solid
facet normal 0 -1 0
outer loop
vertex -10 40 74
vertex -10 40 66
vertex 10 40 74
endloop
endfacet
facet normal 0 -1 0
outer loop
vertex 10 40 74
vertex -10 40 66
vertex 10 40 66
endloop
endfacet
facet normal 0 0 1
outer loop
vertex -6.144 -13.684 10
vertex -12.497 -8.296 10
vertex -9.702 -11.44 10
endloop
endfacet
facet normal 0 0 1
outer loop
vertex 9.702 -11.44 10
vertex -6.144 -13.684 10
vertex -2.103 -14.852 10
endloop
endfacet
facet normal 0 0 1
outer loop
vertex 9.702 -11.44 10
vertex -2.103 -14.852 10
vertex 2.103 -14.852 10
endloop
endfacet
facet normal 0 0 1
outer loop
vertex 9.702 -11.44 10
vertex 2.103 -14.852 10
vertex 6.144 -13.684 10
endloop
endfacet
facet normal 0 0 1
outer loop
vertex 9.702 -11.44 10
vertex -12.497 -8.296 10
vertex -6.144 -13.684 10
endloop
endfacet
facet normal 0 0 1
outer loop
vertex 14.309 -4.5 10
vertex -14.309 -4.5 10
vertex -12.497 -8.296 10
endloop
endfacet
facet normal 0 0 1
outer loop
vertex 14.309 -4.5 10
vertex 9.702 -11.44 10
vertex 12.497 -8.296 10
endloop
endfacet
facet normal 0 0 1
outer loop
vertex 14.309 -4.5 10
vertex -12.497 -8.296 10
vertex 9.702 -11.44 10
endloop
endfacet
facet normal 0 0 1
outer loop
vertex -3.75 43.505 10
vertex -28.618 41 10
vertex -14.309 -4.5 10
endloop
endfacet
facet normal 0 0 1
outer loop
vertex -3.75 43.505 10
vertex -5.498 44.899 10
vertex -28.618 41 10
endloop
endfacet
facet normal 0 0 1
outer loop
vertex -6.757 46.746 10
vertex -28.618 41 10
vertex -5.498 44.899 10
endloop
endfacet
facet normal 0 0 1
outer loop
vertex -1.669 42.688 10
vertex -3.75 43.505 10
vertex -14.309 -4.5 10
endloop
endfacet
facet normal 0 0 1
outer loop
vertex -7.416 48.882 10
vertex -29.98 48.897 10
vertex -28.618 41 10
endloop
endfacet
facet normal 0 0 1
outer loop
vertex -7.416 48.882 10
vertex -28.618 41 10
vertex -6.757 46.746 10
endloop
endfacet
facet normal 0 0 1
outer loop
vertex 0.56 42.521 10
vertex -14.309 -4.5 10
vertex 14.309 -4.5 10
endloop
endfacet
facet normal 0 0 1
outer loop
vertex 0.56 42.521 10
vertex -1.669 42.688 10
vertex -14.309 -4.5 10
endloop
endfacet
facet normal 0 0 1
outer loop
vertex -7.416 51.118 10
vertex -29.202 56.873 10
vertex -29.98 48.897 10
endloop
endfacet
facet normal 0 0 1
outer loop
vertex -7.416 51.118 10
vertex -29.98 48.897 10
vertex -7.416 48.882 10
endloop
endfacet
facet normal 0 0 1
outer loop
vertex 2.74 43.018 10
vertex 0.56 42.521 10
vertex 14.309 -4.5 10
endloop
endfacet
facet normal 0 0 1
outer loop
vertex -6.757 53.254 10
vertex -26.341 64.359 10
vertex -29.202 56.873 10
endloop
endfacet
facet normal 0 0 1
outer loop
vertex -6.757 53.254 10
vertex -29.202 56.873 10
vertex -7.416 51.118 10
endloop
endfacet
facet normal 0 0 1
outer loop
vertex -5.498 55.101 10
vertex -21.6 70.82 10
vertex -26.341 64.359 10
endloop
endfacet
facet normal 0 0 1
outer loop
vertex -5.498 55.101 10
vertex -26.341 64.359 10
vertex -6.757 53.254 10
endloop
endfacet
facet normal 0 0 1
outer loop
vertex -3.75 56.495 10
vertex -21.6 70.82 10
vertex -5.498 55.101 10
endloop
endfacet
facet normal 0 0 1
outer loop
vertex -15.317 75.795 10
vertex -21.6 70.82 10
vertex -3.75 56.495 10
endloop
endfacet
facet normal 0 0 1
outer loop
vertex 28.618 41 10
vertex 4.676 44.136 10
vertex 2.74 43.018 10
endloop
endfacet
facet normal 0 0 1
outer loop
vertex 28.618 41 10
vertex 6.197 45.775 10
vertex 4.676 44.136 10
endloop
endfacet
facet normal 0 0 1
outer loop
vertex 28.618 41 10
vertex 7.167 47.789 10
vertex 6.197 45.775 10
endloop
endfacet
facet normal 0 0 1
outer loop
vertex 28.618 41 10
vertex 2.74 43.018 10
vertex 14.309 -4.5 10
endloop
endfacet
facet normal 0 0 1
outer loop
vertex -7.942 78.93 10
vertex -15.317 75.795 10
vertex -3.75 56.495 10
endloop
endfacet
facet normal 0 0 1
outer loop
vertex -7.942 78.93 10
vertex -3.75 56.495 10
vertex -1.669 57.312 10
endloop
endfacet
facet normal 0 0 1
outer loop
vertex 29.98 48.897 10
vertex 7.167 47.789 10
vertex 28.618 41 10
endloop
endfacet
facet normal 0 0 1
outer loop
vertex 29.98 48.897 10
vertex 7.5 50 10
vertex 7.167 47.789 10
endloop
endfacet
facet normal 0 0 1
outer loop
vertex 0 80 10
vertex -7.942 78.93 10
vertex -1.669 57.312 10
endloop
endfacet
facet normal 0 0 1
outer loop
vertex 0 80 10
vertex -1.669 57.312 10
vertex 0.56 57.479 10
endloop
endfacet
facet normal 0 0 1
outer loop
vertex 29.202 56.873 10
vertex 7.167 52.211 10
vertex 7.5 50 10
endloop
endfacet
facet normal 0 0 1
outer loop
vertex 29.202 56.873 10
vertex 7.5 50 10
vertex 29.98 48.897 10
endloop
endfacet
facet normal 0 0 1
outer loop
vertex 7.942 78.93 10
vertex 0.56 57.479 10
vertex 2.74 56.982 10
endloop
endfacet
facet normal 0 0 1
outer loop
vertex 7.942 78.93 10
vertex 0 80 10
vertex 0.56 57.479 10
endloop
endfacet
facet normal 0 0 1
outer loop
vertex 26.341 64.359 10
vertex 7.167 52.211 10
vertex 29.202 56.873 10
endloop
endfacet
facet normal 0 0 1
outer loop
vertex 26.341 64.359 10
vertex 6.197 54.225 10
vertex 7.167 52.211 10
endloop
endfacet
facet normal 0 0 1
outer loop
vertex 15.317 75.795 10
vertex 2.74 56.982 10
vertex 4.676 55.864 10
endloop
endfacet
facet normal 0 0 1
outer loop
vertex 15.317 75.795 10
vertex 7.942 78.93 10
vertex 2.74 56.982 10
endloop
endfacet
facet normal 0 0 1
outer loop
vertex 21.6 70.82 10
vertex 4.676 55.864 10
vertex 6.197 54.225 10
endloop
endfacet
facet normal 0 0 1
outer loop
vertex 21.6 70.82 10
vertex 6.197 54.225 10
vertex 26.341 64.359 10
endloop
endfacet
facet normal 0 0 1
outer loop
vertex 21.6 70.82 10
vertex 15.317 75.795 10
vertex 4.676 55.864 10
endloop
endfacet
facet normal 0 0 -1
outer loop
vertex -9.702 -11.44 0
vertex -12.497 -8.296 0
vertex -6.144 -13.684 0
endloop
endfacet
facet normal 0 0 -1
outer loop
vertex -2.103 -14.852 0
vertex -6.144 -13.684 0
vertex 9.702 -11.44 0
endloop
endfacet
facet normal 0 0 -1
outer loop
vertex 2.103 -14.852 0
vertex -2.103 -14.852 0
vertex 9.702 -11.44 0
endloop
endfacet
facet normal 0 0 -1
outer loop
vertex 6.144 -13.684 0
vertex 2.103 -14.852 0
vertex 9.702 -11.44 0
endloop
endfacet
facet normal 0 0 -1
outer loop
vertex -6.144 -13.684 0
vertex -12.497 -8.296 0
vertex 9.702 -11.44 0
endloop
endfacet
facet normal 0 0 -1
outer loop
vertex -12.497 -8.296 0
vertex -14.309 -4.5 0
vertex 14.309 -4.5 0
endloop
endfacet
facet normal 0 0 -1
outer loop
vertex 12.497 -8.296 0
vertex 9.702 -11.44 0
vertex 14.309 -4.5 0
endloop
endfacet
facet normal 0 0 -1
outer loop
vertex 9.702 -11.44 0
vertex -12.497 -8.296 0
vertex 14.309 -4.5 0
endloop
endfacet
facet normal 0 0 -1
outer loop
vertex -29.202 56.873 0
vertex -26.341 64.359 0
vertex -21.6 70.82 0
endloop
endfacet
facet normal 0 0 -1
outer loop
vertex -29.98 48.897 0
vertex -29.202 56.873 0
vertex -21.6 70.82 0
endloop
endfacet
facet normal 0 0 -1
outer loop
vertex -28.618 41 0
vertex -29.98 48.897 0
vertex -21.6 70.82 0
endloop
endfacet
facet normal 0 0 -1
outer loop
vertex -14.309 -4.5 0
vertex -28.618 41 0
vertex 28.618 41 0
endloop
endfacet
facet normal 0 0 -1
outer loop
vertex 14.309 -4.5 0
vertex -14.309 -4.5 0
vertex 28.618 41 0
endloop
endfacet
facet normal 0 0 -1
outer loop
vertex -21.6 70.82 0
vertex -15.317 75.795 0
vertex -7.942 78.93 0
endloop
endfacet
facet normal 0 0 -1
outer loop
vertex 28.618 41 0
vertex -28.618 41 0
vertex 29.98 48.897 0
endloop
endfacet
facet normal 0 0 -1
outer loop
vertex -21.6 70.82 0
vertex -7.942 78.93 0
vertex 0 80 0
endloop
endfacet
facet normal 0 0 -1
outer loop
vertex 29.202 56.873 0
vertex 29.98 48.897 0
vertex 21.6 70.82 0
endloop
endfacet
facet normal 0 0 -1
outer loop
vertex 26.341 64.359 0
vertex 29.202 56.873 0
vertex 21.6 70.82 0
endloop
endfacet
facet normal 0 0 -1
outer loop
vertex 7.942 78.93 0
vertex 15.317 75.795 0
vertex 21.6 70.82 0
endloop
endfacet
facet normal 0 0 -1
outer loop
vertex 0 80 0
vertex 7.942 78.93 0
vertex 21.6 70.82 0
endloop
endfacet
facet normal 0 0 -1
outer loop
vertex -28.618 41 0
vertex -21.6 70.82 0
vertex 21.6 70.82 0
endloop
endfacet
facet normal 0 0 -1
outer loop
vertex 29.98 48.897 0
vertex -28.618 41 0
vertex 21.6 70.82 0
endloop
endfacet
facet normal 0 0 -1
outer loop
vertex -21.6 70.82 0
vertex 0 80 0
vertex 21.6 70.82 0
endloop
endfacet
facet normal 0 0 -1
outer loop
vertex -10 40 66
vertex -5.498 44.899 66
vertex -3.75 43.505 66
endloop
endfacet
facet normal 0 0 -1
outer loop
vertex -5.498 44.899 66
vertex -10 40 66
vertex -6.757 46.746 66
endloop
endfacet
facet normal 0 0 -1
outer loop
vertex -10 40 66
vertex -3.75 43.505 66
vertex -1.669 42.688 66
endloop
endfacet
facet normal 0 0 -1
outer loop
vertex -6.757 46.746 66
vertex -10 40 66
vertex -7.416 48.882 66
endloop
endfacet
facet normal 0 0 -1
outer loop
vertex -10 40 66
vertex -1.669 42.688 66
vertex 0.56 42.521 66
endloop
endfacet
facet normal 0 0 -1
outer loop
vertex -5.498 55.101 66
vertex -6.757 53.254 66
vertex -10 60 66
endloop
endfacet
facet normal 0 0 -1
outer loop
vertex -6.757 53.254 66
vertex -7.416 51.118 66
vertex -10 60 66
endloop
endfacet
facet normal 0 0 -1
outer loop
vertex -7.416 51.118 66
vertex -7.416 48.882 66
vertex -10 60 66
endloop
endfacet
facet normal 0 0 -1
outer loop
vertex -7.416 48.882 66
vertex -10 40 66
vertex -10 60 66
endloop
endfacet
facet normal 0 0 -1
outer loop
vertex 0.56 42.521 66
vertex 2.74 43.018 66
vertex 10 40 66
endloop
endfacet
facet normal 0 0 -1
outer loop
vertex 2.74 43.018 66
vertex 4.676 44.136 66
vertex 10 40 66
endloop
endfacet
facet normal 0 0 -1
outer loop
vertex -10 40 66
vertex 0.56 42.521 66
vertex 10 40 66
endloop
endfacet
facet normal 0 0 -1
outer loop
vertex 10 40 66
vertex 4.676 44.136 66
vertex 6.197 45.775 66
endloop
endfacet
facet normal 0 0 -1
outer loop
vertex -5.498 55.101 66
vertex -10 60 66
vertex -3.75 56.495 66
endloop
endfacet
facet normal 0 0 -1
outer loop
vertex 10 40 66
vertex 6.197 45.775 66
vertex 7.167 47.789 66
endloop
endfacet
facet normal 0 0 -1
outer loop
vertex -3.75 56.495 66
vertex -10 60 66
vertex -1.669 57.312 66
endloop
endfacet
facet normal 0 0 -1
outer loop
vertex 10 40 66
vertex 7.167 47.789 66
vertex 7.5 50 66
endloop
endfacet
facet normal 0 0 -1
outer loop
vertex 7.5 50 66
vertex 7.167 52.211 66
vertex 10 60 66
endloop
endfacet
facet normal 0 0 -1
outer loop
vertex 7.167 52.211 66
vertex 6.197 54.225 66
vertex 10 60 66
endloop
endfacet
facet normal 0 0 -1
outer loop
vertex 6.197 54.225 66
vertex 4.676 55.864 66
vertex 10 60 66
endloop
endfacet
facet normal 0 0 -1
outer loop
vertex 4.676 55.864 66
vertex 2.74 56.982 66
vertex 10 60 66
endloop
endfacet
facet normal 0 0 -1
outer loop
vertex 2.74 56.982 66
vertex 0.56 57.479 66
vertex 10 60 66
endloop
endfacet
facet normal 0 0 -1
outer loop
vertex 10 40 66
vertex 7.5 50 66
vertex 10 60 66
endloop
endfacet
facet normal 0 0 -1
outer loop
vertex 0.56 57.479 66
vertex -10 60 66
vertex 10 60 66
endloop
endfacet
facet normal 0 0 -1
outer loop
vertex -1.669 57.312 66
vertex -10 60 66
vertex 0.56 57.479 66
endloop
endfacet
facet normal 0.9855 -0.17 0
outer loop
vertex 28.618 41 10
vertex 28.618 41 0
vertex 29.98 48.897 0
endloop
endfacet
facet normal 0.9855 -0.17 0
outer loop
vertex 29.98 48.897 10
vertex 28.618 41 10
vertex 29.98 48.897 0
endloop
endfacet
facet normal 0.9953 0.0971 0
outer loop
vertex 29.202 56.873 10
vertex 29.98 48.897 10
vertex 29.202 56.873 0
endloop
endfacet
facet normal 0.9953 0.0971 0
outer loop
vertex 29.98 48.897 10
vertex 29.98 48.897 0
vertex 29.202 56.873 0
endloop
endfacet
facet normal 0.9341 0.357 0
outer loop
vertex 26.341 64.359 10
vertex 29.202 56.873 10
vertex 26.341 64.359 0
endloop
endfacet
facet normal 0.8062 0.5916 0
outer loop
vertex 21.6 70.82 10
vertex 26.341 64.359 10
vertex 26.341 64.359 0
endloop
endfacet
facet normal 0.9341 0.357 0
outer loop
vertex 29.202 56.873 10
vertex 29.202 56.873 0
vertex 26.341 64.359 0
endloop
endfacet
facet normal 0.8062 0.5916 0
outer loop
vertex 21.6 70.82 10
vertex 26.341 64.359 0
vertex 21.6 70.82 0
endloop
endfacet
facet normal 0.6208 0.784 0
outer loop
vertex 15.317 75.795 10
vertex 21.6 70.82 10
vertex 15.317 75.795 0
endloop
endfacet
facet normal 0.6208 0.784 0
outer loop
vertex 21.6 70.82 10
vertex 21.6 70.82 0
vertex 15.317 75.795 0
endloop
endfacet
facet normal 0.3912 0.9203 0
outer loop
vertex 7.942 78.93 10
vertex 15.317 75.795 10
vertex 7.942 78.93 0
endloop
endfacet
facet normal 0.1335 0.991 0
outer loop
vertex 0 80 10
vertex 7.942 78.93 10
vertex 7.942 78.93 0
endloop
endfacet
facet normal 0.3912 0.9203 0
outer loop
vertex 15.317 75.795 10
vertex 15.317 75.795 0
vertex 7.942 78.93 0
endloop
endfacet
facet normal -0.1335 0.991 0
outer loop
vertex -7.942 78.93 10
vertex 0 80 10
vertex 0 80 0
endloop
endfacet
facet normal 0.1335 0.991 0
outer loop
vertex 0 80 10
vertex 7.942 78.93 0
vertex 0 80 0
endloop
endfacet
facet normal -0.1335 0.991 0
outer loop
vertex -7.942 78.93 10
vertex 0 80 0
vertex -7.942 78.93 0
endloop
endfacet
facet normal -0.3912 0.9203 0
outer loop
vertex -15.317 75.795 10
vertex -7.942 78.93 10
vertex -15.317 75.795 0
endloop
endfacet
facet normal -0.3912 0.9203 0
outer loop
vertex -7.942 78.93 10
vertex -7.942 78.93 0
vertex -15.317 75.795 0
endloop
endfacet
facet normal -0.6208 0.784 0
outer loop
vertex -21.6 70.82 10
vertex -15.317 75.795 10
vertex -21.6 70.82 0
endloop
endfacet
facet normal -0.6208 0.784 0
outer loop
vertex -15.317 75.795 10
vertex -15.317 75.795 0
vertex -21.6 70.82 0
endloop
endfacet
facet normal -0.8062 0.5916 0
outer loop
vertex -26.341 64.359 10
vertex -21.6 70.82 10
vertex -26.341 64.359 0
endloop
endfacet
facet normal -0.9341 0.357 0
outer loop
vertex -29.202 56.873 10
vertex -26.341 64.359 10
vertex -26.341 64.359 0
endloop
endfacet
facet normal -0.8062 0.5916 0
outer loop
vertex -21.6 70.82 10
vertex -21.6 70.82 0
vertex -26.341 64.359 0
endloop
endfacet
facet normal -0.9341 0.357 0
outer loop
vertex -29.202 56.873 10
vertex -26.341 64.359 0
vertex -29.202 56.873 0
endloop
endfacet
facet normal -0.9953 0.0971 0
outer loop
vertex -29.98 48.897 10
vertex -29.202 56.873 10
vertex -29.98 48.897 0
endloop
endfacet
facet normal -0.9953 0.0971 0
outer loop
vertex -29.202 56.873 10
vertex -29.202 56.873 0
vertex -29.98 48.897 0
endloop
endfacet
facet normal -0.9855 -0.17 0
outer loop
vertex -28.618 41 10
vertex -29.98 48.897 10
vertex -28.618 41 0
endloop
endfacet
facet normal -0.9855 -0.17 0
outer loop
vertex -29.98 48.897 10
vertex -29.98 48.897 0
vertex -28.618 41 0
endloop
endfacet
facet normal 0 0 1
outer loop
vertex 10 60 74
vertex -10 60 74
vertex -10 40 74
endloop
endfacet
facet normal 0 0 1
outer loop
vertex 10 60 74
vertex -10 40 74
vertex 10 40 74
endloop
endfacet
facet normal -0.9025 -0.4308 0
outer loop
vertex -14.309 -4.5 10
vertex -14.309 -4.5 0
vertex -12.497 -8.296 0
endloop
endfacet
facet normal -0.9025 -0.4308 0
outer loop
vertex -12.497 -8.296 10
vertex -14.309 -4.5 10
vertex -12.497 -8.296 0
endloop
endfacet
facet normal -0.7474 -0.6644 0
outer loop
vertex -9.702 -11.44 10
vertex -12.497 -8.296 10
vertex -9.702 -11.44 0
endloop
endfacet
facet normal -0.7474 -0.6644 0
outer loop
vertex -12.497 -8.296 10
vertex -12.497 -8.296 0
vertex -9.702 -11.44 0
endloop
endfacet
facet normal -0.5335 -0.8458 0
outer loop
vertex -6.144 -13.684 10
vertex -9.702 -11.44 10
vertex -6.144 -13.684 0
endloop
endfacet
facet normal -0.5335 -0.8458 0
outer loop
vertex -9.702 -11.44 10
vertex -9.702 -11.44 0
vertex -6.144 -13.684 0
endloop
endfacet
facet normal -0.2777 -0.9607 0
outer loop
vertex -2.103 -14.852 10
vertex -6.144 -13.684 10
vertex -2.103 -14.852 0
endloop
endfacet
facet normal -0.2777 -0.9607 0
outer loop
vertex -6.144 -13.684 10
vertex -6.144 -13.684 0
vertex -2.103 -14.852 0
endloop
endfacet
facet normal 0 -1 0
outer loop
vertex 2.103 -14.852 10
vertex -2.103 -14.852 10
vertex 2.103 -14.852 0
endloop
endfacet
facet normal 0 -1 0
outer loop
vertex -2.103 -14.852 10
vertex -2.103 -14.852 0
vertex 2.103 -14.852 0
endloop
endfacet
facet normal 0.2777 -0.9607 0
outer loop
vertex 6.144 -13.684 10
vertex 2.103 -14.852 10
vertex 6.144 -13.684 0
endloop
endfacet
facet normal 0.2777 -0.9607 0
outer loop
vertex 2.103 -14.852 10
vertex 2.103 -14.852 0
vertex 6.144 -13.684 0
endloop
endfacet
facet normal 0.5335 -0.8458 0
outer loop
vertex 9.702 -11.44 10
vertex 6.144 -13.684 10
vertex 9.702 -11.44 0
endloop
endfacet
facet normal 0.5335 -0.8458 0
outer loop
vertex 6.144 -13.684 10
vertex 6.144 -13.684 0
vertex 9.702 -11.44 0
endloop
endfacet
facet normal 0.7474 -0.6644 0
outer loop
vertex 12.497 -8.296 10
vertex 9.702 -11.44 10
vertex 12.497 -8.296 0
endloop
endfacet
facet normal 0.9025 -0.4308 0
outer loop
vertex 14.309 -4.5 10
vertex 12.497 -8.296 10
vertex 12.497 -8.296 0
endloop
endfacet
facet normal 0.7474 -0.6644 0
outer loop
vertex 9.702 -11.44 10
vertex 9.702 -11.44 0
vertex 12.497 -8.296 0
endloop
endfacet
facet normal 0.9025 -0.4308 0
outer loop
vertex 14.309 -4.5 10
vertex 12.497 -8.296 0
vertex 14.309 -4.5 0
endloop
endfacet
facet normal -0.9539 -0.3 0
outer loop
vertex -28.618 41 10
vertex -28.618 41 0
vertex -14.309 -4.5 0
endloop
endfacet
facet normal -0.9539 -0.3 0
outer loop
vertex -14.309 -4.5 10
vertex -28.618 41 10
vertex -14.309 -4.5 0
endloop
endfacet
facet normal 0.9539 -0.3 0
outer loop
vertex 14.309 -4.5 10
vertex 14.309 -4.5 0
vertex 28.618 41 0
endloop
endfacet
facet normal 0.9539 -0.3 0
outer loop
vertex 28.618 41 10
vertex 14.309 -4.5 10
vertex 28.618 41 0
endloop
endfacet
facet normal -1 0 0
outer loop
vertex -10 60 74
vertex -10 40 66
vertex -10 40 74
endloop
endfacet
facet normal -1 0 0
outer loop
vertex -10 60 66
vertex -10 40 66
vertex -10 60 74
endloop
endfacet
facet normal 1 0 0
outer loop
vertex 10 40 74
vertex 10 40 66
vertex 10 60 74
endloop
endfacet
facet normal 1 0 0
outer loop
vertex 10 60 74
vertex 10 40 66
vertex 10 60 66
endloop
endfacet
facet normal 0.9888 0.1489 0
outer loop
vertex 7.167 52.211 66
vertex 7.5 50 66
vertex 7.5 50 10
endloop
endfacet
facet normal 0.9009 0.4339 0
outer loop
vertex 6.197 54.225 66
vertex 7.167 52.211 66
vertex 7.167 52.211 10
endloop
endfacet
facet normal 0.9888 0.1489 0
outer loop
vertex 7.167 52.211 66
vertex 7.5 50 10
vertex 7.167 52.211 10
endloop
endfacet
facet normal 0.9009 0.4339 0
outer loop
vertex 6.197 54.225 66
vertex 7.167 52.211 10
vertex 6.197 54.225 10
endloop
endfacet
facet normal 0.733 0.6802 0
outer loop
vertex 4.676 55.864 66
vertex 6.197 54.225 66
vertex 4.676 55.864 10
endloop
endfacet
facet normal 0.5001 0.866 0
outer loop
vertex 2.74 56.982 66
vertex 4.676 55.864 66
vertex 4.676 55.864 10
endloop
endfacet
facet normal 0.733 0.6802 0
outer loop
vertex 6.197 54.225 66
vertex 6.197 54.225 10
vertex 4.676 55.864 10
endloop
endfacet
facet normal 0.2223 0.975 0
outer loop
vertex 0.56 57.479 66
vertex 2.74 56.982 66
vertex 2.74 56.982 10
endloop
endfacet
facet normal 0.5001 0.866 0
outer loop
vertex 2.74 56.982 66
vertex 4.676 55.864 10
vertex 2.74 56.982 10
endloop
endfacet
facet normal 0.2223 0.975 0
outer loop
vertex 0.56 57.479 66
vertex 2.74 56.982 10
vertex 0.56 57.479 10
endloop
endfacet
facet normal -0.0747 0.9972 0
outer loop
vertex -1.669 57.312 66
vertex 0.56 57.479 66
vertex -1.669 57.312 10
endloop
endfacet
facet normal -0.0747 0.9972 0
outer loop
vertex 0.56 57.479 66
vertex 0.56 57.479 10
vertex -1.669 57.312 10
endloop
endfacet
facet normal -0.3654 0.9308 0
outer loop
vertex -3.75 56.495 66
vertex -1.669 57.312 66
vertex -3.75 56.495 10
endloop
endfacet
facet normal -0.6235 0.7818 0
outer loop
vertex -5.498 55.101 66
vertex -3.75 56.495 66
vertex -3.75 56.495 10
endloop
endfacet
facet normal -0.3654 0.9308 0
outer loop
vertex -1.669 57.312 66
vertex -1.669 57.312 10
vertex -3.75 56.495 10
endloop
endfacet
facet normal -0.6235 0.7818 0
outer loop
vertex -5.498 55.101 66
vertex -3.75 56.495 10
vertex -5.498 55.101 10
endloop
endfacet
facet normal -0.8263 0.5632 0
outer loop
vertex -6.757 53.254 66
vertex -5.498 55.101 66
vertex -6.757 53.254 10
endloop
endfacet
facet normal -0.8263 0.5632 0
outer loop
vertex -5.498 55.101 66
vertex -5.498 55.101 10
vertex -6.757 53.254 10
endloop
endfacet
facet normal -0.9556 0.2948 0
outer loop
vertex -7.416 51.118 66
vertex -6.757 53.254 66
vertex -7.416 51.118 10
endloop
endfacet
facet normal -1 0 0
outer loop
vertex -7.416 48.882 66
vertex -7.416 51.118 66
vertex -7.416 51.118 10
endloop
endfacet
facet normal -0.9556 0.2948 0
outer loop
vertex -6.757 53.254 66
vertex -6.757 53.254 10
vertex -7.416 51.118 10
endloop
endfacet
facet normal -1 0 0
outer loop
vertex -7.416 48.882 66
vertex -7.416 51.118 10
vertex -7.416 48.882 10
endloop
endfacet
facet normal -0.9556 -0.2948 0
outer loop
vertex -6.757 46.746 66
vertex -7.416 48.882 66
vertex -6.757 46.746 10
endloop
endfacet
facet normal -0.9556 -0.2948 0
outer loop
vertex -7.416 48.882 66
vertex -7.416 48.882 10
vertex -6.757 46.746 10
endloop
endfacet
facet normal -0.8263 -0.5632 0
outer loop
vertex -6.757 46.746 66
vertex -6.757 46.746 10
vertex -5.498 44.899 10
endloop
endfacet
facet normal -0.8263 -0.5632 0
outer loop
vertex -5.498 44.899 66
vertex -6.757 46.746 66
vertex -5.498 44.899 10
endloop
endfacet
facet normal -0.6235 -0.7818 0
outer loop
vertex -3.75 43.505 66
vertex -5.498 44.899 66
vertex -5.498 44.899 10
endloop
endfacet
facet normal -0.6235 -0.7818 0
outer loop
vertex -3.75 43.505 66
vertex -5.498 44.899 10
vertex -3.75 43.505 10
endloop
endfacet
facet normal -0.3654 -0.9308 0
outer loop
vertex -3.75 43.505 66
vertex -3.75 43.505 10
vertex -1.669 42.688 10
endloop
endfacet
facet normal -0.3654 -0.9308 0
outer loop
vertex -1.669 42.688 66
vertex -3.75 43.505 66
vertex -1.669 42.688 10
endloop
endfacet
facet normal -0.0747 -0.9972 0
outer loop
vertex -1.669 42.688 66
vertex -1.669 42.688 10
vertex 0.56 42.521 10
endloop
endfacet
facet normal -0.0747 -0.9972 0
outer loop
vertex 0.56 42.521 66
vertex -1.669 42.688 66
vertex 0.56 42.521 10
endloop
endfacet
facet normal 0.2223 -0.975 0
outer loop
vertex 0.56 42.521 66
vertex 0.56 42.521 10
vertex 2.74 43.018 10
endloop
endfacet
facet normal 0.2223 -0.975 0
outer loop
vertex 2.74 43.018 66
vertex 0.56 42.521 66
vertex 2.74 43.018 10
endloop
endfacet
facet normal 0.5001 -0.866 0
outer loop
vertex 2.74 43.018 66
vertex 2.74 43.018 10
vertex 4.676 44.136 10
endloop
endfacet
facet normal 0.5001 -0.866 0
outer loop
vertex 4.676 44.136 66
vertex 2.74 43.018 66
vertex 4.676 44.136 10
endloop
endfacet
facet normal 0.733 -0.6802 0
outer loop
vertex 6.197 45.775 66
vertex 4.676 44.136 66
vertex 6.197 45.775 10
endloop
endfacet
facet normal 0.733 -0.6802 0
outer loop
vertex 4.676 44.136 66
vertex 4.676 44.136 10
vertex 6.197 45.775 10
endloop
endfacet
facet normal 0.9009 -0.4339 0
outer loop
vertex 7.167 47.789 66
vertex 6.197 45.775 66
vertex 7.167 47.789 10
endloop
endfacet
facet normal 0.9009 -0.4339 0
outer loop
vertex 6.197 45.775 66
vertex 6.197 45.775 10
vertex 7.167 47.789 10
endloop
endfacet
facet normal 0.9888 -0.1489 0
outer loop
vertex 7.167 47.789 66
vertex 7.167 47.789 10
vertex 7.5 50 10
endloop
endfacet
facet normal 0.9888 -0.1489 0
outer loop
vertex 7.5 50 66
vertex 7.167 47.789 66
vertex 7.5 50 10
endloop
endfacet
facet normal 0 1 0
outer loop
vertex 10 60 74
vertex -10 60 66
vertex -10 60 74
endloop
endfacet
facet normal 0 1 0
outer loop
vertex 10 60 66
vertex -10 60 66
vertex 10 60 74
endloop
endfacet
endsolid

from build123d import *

# Parameters (mm, degrees)
BOSS_EXTRUDE1_DEPTH = 10
SKETCH2_R           = 7.5
BOSS_EXTRUDE2_DEPTH = 56
SKETCH3_W           = 20
SKETCH3_H           = 20
BOSS_EXTRUDE3_DEPTH = 8


with BuildPart() as part:
    # Sketch1 → Boss-Extrude1 (new body)
    with BuildSketch(Plane.XY):
        with BuildLine():
            Line((-28.618176043, 41), (-14.309088021, -4.5))
            ThreePointArc((-14.309088021, -4.5), (0, -15), (14.309088021, -4.5))
            Line((14.309088021, -4.5), (28.618176042, 41))
            ThreePointArc((28.618176042, 41), (0, 80), (-28.618176043, 41))
        make_face()
    extrude(amount=BOSS_EXTRUDE1_DEPTH)

    # Sketch2 → Boss-Extrude2 (add)
    with BuildSketch(Plane.XY.offset(10)):
        with Locations((0, 50)):
            Circle(SKETCH2_R)
    extrude(amount=BOSS_EXTRUDE2_DEPTH)

    # Sketch3 → Boss-Extrude3 (add)
    with BuildSketch(Plane.XY.offset(66)):
        with Locations((0, 50)):
            Rectangle(SKETCH3_W, SKETCH3_H)
    extrude(amount=BOSS_EXTRUDE3_DEPTH)


solid = part.part
